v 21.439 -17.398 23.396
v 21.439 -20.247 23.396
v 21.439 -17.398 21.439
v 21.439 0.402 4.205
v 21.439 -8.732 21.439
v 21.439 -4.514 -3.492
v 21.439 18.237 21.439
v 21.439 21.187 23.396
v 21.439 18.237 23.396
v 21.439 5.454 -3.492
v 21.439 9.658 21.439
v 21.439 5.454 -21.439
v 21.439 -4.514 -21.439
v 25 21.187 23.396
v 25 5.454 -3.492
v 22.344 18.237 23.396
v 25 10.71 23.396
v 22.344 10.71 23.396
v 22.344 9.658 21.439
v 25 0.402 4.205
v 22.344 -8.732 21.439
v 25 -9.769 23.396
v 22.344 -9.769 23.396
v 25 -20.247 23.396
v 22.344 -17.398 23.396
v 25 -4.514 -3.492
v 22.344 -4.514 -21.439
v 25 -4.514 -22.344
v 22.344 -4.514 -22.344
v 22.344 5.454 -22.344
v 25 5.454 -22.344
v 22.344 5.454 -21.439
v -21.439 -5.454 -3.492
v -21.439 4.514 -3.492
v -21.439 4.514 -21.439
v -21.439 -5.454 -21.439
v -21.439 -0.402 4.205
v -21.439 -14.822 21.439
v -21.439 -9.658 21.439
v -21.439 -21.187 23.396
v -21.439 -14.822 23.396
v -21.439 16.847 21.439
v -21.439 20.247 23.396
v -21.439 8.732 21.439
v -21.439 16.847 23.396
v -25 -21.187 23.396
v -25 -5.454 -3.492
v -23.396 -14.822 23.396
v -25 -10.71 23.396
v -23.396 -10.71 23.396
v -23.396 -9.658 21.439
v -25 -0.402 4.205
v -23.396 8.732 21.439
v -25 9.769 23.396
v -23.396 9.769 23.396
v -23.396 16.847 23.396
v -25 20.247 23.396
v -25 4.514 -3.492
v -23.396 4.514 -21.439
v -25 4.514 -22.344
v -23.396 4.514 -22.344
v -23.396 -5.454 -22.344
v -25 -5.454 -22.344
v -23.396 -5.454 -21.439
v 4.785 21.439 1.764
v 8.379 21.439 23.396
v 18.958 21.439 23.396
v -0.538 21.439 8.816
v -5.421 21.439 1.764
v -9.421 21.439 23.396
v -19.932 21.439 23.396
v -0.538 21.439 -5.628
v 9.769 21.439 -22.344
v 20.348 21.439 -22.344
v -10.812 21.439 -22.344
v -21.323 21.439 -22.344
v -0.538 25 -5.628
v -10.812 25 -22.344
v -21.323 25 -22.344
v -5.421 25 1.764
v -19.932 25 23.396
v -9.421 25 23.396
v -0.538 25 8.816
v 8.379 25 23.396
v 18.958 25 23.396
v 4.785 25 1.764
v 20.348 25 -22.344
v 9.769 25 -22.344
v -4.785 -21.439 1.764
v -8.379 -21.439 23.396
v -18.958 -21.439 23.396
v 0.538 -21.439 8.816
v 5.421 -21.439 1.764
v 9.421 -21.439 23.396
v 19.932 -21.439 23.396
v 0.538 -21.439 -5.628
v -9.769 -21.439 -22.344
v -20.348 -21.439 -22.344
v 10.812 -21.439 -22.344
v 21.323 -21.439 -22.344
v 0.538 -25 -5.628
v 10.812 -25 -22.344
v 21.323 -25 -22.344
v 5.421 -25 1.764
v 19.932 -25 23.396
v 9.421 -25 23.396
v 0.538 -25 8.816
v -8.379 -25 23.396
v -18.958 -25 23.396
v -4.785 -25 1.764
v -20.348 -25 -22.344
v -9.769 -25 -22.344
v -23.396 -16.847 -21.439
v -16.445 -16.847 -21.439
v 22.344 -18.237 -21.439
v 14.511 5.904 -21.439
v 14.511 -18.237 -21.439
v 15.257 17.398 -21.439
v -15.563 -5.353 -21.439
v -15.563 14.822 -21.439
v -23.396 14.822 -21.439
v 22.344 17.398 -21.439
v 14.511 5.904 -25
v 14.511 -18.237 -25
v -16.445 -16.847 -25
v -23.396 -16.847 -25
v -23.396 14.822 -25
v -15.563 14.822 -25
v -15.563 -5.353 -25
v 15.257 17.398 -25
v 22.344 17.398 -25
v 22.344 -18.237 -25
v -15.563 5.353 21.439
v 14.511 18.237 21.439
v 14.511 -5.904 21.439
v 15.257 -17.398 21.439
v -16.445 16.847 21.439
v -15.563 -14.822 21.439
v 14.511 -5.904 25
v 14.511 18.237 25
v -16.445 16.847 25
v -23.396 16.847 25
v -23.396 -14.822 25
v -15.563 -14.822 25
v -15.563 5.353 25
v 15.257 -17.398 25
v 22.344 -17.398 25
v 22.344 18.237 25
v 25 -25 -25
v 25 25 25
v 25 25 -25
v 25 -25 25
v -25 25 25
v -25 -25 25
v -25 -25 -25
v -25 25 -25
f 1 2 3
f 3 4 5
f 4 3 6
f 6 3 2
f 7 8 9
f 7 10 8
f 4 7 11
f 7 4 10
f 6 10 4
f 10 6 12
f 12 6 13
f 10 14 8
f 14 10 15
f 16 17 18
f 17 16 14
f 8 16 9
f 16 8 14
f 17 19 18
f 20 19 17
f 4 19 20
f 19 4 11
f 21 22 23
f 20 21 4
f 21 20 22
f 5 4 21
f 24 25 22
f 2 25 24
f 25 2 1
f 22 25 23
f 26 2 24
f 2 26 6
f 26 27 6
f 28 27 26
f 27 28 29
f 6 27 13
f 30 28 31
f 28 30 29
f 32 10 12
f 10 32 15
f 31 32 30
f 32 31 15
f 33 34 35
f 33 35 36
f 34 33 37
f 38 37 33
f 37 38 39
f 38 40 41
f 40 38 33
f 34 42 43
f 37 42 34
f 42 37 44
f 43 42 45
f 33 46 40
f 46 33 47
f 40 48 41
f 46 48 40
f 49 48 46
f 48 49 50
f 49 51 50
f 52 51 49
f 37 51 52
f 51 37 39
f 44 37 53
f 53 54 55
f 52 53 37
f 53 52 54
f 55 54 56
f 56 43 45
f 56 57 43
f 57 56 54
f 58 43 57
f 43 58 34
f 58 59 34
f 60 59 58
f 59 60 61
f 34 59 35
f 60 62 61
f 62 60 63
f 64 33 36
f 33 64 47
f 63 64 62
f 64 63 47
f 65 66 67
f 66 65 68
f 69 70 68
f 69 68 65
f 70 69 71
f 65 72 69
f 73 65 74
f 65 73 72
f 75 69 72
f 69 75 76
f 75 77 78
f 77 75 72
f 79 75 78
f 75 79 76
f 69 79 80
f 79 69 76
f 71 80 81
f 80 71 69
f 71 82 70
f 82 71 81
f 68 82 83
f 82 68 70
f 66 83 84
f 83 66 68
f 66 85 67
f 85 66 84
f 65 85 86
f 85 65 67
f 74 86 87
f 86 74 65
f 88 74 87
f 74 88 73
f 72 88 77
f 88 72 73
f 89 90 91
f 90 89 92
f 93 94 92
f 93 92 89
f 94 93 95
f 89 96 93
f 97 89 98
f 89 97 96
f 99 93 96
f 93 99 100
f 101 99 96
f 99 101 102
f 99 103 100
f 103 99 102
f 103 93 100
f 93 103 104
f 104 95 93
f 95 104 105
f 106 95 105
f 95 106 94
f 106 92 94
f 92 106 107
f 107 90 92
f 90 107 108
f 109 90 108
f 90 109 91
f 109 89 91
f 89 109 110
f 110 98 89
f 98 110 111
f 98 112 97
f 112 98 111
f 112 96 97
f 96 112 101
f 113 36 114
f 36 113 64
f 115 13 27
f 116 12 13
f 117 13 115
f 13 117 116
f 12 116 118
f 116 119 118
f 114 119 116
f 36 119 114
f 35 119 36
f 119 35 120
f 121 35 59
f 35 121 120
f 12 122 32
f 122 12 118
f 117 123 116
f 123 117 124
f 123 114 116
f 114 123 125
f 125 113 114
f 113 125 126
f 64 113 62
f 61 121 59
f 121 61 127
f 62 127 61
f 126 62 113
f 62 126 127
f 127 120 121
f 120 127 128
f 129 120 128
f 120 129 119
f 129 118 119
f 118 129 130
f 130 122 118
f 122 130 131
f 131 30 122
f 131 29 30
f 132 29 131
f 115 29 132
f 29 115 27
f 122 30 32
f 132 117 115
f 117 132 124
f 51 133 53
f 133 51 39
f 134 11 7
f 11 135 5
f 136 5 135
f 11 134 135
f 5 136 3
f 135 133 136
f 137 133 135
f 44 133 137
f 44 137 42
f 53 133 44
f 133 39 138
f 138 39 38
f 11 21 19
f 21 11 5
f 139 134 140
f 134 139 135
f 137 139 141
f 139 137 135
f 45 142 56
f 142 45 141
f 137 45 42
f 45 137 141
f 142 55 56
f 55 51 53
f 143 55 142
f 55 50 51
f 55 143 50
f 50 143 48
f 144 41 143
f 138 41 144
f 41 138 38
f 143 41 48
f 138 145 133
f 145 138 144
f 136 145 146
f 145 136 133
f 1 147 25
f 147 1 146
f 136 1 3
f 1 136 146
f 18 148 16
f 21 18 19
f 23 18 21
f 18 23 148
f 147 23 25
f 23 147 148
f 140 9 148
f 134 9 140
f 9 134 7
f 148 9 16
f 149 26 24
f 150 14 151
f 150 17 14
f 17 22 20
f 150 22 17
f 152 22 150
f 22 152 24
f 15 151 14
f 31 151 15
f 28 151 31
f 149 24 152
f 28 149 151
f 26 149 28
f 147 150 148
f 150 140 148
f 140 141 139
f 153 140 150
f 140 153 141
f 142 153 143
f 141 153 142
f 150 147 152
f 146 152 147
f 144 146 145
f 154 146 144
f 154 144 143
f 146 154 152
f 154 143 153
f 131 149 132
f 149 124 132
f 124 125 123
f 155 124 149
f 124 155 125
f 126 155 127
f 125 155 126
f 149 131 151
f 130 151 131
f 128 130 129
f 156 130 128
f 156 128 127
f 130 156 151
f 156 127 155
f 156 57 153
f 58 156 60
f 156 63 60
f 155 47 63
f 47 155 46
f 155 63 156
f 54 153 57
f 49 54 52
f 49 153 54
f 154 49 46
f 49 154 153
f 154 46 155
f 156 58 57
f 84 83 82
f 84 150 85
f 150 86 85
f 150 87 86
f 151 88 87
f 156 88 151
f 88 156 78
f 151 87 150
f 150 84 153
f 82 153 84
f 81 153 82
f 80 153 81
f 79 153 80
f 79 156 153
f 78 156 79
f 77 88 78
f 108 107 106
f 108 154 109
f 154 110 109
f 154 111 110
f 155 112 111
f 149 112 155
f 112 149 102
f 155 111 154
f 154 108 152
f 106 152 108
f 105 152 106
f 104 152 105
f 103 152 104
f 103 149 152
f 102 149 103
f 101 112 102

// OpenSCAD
// Smooth Shapes
$fn = 100;

// The goal of this test is create a single cube that has a label on each face for the axis
// it represents, with parameterized driving configuration.

// Requirements
// 1) Size of the cube
cube_dimensions_length       = 50;
cube_dimensions_width        = 50;
cube_dimensions_height       = 50;

// 2) Allow the font size, and depth to be configurable.
cube_font                               = "Courier New:style=Bold";
cube_font_size                          = min(cube_dimensions_length,cube_dimensions_width);
cube_font_depth                         = min(cube_dimensions_length,cube_dimensions_width,cube_dimensions_height)/14;

// =============================================================================================================
// Generate the cube
embossed_cube(          cube_dimensions_length,
                        cube_dimensions_width,
                        cube_dimensions_height,
                        cube_font_depth);
                        

// =============================================================================================================
//                                  Support Functions
// =============================================================================================================
module embossed_cube(length, width, height, text_depth)
{
    difference()
    {
        cube([length, width, height] , center=true);
        // Front and Back
        rotate([90,0,90])
        {
                translate([0,0,(length/2)-cube_font_depth+.01])embossed_string("Y", text_depth);
                translate([0,0,-(length/2)+cube_font_depth-.01])rotate([0,180,0])embossed_string("Y", text_depth);
        }      
        // Left and Right
        rotate([90,0,180])
        {
                translate([0,0,(length/2)-cube_font_depth+.01])embossed_string("X", text_depth);
                translate([0,0,-(length/2)+cube_font_depth-.01])rotate([0,180,0])embossed_string("X", text_depth);
        }      
        // Top and Bottom
        rotate([180,0,-90])
        {
                translate([0,0,(length/2)-cube_font_depth+.01])embossed_string("Z", text_depth);
                translate([0,0,-(length/2)+cube_font_depth-.01])rotate([0,180,0])embossed_string("Z", text_depth);
        }       
        
    }    
}
module embossed_string(string_text, depth) 
{
	linear_extrude(height = depth) 
    {
		text(string_text, size = cube_font_size, font = cube_font, halign = "center", valign = "center", $fn = 16);
	}
}
